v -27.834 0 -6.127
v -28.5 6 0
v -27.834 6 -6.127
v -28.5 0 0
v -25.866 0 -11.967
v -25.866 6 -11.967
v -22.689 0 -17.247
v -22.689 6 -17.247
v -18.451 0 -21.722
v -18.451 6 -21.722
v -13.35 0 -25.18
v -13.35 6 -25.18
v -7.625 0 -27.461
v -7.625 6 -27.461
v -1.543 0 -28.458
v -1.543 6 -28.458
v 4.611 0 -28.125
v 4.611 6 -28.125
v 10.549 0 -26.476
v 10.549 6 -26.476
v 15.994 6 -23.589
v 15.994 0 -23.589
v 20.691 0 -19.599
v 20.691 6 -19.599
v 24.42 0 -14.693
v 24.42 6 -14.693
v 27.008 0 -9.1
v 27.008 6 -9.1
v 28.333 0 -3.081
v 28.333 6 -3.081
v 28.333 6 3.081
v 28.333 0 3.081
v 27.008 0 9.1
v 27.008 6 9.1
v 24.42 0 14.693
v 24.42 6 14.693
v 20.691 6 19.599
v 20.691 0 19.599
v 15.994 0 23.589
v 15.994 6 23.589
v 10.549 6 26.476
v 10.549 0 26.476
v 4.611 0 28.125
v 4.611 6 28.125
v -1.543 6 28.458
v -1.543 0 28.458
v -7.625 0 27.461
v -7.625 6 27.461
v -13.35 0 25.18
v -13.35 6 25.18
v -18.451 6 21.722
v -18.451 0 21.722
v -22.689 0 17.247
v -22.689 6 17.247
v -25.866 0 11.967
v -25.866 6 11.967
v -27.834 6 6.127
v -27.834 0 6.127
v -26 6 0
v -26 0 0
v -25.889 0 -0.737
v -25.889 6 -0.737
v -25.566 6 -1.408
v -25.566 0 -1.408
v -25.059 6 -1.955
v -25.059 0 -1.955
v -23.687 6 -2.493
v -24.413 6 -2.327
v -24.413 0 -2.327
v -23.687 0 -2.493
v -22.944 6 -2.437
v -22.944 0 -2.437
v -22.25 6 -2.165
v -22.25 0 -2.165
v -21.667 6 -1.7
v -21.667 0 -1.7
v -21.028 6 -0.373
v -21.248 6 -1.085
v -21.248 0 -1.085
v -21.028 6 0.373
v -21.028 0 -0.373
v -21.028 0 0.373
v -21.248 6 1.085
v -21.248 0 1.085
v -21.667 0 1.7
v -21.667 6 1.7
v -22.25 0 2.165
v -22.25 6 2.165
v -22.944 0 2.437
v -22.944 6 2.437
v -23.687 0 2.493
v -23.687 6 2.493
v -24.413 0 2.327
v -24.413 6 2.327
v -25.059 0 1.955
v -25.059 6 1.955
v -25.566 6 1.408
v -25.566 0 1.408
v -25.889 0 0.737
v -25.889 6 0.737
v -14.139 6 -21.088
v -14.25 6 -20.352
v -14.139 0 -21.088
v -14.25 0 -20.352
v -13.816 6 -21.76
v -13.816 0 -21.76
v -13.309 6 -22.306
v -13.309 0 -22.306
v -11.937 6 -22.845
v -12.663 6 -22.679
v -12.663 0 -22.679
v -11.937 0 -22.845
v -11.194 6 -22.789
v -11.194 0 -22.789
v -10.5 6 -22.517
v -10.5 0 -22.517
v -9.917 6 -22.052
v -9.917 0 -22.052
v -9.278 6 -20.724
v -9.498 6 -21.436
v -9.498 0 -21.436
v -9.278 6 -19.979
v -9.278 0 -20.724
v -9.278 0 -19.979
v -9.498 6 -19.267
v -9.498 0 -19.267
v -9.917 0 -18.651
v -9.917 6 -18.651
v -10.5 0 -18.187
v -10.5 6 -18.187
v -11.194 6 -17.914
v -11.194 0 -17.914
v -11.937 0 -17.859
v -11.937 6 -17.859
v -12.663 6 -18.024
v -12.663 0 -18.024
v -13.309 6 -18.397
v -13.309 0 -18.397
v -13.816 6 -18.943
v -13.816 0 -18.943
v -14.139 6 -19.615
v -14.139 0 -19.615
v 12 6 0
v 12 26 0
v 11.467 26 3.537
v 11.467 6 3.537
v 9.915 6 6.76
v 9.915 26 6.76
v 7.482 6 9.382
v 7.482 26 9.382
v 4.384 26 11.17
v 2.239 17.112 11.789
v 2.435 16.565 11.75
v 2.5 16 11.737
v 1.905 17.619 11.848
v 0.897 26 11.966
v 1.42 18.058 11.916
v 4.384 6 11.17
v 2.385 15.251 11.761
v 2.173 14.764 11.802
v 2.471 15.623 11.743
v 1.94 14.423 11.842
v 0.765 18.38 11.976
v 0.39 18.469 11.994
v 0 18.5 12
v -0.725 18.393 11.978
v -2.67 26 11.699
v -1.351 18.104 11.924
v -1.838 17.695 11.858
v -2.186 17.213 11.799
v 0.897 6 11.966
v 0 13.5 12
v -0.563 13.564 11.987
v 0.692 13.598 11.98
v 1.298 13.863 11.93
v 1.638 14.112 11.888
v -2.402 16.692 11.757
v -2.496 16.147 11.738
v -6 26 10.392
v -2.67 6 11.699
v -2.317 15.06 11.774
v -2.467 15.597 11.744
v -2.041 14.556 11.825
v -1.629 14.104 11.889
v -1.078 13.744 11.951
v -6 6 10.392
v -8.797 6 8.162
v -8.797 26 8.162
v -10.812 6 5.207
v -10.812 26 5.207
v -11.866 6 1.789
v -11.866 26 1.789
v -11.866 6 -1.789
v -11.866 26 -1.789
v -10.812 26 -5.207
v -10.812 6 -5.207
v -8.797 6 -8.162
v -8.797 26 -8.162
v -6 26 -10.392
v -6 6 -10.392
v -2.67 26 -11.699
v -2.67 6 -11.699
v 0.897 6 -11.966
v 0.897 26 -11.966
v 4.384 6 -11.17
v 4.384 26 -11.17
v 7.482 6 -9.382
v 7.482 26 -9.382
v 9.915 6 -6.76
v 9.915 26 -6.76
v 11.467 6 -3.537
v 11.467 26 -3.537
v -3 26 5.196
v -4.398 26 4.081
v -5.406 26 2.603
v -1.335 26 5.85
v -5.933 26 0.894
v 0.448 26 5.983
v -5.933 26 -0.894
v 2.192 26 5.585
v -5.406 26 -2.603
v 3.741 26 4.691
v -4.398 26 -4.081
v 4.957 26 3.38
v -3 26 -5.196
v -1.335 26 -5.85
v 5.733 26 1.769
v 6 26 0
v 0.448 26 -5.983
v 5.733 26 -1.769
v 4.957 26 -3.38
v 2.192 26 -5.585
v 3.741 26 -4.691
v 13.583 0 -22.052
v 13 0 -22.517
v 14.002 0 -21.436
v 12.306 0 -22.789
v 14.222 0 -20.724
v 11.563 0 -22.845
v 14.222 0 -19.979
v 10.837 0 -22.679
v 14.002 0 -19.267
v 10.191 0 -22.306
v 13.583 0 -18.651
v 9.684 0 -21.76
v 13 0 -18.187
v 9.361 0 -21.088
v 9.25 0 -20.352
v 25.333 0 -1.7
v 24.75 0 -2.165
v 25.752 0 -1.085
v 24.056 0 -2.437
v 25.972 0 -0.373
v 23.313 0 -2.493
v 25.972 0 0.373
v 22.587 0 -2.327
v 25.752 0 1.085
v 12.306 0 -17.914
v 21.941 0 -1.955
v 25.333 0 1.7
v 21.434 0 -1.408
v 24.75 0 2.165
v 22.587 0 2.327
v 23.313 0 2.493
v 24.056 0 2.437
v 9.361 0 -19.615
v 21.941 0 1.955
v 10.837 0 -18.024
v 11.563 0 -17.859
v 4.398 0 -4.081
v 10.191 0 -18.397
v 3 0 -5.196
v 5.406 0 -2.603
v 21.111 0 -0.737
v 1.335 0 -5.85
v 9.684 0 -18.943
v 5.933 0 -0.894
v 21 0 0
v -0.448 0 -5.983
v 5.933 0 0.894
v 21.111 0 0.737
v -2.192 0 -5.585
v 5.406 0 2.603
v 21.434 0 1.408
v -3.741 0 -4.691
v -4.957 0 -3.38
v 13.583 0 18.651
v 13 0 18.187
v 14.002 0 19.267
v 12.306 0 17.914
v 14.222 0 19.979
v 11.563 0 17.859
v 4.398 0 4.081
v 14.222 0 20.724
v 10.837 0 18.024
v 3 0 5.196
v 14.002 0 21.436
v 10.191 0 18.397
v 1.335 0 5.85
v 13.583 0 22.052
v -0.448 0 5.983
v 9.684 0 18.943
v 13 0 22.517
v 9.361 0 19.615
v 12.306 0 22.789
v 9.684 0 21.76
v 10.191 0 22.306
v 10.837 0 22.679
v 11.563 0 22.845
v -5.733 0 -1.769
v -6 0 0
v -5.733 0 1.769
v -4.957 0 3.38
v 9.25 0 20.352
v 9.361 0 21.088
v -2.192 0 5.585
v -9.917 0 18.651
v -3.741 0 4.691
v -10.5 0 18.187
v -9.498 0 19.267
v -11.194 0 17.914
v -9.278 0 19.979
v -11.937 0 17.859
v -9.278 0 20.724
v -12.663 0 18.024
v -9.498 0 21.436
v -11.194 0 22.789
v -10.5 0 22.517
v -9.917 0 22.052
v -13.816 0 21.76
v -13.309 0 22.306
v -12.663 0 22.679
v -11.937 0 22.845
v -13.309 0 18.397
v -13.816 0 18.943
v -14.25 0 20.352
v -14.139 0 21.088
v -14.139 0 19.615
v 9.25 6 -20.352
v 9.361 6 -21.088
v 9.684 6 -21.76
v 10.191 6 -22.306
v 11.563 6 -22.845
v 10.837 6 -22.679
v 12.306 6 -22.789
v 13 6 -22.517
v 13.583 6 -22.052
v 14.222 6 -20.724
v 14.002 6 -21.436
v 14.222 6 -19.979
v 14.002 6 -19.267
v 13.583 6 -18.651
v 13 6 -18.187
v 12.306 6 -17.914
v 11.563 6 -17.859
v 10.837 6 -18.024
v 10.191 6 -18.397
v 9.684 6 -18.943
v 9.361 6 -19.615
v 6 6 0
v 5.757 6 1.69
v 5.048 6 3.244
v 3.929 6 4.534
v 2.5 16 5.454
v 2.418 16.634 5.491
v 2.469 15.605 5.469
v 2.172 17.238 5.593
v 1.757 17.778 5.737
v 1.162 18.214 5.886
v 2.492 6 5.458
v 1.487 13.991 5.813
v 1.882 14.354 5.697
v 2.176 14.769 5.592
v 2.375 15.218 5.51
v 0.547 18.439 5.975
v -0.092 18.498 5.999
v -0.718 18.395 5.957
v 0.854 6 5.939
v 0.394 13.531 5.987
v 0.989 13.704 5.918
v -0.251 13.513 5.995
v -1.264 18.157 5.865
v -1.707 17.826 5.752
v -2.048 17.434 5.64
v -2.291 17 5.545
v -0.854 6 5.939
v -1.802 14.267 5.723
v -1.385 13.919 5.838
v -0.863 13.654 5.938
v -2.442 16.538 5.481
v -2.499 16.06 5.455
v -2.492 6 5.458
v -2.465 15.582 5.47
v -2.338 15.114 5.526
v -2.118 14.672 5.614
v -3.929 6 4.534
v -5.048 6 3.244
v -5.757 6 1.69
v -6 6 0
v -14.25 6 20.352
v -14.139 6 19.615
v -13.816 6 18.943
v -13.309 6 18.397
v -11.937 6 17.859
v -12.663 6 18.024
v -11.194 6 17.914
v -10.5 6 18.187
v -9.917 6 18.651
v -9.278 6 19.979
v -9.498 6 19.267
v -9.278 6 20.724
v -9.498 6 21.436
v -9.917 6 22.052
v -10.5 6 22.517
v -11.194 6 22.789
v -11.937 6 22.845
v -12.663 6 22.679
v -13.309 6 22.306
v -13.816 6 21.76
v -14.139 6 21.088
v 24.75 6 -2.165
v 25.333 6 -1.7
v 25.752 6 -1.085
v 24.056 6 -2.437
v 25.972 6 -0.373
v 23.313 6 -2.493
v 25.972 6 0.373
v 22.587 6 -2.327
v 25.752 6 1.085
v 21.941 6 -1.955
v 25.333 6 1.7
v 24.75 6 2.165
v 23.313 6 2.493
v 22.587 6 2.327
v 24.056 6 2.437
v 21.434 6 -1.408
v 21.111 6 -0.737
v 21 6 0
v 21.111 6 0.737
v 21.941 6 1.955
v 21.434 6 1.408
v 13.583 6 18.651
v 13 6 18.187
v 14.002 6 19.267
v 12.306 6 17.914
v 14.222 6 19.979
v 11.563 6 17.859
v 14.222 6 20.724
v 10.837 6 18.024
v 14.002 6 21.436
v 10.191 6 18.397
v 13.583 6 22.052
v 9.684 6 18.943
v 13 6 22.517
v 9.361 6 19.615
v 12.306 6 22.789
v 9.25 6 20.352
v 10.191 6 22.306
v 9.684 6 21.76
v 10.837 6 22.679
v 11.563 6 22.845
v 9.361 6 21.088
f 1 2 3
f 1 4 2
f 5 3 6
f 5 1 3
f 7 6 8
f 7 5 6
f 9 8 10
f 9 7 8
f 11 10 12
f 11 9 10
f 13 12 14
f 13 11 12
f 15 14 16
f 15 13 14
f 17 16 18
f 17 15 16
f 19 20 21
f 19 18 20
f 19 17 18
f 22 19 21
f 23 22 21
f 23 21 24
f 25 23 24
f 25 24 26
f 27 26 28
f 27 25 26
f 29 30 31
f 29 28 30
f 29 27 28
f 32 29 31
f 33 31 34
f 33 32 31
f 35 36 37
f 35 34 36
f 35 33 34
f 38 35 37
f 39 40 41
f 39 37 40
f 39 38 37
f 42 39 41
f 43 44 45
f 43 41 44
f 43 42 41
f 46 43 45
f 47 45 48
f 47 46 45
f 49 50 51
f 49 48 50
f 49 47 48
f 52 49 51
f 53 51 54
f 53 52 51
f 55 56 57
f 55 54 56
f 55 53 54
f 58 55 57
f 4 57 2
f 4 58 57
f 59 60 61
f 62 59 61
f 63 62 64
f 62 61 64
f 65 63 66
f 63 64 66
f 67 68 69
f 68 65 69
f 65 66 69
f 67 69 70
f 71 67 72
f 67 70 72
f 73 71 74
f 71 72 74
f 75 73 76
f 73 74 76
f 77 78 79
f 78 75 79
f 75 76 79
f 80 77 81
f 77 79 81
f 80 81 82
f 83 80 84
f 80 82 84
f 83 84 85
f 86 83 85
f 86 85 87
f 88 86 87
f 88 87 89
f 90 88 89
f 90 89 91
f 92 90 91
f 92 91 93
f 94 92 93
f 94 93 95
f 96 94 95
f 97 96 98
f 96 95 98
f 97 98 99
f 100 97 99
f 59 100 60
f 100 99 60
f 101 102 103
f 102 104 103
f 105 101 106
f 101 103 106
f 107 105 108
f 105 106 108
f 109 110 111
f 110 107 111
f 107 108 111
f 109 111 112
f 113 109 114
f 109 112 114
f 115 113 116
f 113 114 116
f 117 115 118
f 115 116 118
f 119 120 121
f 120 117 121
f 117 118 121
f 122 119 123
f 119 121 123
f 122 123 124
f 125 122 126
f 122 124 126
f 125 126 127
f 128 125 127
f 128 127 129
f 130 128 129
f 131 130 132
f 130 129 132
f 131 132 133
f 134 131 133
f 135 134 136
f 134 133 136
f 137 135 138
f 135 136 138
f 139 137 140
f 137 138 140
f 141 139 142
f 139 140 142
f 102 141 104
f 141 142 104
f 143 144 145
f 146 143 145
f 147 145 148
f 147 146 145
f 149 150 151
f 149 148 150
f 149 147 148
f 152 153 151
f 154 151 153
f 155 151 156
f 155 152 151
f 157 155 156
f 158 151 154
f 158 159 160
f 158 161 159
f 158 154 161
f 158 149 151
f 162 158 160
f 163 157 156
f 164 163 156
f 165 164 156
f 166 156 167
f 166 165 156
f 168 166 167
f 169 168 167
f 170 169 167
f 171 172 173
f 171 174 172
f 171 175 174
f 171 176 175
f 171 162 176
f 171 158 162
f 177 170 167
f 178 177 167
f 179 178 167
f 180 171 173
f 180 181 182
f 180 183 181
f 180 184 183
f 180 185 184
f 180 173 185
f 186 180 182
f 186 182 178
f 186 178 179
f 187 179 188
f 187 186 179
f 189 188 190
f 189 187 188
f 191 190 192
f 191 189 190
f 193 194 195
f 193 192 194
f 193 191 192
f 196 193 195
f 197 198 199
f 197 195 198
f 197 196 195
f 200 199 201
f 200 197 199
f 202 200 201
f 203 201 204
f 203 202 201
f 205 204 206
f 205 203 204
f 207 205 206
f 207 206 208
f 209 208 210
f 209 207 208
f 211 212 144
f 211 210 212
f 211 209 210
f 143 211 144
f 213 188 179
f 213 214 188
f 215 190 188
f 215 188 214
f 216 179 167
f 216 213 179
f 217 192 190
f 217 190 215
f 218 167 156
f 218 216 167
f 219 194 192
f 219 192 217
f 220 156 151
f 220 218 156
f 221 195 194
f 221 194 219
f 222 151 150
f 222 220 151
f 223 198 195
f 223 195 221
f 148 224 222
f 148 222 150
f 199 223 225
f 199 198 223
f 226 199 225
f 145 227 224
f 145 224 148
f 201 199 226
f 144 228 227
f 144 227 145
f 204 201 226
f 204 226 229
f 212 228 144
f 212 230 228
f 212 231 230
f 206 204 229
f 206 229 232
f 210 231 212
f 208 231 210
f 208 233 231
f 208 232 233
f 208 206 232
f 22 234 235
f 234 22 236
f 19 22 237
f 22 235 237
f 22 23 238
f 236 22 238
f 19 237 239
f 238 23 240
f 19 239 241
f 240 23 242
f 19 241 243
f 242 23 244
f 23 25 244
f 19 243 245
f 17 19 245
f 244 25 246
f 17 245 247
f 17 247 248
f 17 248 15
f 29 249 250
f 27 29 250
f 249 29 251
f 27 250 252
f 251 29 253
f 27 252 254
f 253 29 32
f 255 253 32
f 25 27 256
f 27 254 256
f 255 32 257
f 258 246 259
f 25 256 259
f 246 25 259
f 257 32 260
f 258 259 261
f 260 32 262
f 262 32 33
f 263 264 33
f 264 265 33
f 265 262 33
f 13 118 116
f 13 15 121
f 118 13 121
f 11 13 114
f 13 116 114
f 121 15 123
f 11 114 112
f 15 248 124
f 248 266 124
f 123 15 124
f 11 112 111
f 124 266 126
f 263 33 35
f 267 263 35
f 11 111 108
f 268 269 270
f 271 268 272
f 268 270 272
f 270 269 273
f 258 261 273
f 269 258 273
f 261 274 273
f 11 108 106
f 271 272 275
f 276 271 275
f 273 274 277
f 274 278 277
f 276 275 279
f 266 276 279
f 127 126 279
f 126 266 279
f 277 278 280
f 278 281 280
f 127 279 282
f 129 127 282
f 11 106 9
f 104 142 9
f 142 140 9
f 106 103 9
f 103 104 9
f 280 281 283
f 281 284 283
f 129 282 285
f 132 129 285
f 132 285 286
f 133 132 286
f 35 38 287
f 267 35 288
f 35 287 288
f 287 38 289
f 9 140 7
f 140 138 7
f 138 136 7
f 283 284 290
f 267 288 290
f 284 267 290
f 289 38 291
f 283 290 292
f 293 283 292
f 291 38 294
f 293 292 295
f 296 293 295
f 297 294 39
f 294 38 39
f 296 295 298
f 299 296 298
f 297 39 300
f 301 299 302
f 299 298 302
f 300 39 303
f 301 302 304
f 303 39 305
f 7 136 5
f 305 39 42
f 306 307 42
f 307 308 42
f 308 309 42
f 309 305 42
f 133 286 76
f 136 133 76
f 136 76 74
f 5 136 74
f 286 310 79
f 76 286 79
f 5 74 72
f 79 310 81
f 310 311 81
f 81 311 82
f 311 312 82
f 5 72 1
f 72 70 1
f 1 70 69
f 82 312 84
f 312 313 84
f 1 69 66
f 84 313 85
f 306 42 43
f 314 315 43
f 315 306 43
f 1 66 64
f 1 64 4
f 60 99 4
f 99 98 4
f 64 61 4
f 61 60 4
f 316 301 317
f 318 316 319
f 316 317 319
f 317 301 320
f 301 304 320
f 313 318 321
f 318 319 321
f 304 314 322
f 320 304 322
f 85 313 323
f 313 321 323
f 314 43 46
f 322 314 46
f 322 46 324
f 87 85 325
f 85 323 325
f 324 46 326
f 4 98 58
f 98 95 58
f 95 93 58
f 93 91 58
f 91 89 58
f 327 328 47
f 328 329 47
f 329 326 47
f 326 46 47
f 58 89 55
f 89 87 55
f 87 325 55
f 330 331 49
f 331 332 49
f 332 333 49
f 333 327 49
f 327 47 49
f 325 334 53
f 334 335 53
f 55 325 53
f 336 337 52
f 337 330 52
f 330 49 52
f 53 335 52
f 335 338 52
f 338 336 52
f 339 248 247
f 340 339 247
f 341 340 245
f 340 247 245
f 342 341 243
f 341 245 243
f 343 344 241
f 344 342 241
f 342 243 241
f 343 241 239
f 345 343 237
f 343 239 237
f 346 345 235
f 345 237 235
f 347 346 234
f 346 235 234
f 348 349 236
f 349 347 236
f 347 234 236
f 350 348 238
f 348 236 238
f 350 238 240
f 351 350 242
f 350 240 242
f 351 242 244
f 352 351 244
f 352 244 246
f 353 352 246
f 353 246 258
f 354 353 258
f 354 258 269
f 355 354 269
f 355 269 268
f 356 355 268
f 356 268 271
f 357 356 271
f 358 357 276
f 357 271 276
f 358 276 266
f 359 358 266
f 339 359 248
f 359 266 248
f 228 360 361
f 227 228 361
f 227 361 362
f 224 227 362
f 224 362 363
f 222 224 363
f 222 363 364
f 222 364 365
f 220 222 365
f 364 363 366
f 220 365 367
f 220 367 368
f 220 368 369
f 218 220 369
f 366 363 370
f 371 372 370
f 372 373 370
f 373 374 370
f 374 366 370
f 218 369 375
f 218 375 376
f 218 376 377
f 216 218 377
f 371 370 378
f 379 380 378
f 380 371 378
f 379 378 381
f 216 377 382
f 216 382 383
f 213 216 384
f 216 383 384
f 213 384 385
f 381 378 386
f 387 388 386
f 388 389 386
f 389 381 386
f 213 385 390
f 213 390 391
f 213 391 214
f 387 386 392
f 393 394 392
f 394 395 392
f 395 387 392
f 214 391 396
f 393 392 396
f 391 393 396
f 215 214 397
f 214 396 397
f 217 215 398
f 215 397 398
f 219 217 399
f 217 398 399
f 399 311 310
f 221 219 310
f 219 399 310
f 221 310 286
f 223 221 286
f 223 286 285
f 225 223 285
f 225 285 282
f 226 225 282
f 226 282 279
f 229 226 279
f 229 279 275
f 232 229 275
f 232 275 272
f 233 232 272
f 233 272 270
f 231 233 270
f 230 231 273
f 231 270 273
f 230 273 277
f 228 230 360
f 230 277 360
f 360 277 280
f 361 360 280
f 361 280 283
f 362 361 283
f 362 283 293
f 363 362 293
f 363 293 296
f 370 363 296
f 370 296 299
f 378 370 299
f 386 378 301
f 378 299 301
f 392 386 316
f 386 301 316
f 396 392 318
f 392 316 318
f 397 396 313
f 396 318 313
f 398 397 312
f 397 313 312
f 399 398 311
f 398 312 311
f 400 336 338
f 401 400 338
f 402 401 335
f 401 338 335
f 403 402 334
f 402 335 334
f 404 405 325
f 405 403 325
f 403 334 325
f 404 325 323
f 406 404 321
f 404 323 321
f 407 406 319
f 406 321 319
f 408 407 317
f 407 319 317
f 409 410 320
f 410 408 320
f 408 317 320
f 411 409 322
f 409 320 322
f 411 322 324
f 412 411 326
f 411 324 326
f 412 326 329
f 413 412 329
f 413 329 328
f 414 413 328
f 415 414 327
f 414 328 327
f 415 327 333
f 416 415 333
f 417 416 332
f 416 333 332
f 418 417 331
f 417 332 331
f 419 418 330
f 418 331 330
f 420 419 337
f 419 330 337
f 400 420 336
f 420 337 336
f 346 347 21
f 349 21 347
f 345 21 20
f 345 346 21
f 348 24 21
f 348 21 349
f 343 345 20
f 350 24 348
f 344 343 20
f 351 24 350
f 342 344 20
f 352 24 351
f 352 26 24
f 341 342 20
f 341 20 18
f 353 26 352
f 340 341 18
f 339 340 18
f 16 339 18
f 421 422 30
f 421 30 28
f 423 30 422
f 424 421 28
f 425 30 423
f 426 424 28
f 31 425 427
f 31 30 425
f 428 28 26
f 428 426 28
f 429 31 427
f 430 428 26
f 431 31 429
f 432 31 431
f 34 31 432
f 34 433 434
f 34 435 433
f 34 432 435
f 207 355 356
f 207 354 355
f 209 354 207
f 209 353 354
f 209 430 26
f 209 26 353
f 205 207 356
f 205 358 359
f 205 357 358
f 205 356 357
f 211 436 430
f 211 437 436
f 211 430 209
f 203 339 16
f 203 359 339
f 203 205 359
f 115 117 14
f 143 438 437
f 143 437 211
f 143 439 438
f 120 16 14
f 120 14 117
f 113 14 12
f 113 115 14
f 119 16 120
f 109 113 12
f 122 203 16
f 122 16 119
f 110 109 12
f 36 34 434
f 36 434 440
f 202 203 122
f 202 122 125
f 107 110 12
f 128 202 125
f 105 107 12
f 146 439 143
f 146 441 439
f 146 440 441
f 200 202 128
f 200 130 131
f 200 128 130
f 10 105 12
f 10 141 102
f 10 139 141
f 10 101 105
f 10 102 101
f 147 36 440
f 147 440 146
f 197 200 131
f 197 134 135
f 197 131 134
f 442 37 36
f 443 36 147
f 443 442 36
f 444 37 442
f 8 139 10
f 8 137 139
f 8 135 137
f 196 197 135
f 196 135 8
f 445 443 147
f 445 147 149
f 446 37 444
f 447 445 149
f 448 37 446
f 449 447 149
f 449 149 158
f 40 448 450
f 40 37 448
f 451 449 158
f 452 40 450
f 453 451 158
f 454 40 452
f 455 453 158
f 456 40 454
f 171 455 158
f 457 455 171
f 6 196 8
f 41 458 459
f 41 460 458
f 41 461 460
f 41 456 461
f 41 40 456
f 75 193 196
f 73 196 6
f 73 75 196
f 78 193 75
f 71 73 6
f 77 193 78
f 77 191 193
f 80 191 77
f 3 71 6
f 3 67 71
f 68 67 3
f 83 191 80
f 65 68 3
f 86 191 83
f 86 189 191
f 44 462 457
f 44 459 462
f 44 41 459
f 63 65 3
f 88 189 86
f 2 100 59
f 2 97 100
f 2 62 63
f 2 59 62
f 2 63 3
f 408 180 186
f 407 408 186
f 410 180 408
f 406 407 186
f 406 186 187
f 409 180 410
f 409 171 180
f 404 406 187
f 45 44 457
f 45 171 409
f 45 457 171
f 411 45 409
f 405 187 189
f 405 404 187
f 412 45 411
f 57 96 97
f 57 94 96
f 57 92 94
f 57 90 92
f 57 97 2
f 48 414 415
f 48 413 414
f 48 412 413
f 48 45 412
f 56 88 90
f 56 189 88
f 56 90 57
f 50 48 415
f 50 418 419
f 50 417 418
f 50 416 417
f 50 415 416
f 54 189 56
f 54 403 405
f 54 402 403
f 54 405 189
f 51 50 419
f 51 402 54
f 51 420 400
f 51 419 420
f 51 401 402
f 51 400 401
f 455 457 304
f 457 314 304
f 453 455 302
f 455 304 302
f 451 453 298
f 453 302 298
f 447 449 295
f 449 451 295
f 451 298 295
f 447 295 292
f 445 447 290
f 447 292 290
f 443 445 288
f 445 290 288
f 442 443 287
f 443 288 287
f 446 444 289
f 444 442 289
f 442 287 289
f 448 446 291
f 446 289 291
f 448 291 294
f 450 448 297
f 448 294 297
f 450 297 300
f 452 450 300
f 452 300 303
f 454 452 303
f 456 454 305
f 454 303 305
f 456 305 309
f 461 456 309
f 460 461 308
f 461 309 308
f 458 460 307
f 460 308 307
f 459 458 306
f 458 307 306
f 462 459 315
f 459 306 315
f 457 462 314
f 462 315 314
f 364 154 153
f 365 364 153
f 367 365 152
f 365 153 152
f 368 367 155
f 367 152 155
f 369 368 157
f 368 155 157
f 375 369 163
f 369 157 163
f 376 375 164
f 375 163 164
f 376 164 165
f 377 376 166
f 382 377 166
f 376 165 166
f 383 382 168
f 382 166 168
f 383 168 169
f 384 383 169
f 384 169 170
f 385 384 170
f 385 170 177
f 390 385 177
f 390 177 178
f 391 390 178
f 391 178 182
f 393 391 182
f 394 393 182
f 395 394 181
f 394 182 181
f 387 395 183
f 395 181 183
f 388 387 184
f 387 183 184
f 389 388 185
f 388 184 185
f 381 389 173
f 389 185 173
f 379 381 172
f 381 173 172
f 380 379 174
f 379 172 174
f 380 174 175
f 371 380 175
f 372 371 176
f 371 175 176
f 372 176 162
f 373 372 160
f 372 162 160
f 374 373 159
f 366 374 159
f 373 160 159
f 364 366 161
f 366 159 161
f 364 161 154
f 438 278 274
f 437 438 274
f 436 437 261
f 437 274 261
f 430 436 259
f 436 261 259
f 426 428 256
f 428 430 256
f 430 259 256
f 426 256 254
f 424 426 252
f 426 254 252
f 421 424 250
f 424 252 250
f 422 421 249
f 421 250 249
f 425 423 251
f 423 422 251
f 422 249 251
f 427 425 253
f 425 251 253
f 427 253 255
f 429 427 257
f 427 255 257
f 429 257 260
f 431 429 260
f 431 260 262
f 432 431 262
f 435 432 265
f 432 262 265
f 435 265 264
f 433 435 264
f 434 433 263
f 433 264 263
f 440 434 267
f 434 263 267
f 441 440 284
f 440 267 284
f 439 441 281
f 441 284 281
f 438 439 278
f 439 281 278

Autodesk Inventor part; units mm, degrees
ref_plane "YZ Plane" through (0, 0, 0) normal (1, 0, 0) x (0, 1, 0)
ref_plane "XZ Plane" through (0, 0, 0) normal (0, 1, 0) x (-1, 0, 0)
sketch "スケッチ1" plane through (0, 0, 0) normal (0, 1, 0) x (-1, 0, 0)
  circle A0 centre (0, 0) radius 28.5
  line L0 (-28.5, 0) -> (28.5, 0) construction
  circle A1 centre (23.5, 0) radius 2.5
  circle A2 centre (11.75, 20.3516) radius 2.5
  circle A3 centre (-11.75, 20.3516) radius 2.5
  circle A4 centre (-23.5, 0) radius 2.5
  circle A5 centre (-11.75, -20.3516) radius 2.5
  circle A6 centre (11.75, -20.3516) radius 2.5
  circle A7 centre (0, 0) radius 6
  dimension "d0" = 57
  dimension "d1" = 5
  dimension "d2" = 23.5
  dimension "d6" = 360
  dimension "d10" = 12
extrude "押し出し1" add sketch "スケッチ1" along normal blind 6
sketch "スケッチ2" plane through (0, 6, 0) normal (0, 1, 0) x (1, 0, 0)
  circle A0 centre (0, 0) radius 12
  circle A1 centre (0, 0) radius 6 projected
  dimension "d11" = 24
extrude "押し出し2" add sketch "スケッチ2" along normal blind 20
ref_plane "作業平面1" through (0, 6, 12) normal (0, 0, 1) x (1, 0, 0)
sketch "スケッチ3" plane through (0, 6, 12) normal (0, 0, 1) x (1, 0, 0)
  line L0 (12, 20) -> (-12, 20) projected
  line L1 (12, 20) -> (-12, 20) projected
  line L2 (-12, 0) -> (12, 0) projected
  circle A0 centre (0, 10) radius 2.5
  line L3 (0, 0) -> (0, 20) construction
  point P0 (0, -6)
  dimension "d14" = 20
  dimension "d15" = 5
  dimension "d16" = 10
extrude "押し出し3" cut sketch "スケッチ3" against normal up to surface
thread "ねじ1" size "M5x0.8" class "6H" standard "ANSI Metric M Profile" length 55
equation "\"d16\" = 0.5 * d14"
properties part number "frange" material "ステンレス鋼"
